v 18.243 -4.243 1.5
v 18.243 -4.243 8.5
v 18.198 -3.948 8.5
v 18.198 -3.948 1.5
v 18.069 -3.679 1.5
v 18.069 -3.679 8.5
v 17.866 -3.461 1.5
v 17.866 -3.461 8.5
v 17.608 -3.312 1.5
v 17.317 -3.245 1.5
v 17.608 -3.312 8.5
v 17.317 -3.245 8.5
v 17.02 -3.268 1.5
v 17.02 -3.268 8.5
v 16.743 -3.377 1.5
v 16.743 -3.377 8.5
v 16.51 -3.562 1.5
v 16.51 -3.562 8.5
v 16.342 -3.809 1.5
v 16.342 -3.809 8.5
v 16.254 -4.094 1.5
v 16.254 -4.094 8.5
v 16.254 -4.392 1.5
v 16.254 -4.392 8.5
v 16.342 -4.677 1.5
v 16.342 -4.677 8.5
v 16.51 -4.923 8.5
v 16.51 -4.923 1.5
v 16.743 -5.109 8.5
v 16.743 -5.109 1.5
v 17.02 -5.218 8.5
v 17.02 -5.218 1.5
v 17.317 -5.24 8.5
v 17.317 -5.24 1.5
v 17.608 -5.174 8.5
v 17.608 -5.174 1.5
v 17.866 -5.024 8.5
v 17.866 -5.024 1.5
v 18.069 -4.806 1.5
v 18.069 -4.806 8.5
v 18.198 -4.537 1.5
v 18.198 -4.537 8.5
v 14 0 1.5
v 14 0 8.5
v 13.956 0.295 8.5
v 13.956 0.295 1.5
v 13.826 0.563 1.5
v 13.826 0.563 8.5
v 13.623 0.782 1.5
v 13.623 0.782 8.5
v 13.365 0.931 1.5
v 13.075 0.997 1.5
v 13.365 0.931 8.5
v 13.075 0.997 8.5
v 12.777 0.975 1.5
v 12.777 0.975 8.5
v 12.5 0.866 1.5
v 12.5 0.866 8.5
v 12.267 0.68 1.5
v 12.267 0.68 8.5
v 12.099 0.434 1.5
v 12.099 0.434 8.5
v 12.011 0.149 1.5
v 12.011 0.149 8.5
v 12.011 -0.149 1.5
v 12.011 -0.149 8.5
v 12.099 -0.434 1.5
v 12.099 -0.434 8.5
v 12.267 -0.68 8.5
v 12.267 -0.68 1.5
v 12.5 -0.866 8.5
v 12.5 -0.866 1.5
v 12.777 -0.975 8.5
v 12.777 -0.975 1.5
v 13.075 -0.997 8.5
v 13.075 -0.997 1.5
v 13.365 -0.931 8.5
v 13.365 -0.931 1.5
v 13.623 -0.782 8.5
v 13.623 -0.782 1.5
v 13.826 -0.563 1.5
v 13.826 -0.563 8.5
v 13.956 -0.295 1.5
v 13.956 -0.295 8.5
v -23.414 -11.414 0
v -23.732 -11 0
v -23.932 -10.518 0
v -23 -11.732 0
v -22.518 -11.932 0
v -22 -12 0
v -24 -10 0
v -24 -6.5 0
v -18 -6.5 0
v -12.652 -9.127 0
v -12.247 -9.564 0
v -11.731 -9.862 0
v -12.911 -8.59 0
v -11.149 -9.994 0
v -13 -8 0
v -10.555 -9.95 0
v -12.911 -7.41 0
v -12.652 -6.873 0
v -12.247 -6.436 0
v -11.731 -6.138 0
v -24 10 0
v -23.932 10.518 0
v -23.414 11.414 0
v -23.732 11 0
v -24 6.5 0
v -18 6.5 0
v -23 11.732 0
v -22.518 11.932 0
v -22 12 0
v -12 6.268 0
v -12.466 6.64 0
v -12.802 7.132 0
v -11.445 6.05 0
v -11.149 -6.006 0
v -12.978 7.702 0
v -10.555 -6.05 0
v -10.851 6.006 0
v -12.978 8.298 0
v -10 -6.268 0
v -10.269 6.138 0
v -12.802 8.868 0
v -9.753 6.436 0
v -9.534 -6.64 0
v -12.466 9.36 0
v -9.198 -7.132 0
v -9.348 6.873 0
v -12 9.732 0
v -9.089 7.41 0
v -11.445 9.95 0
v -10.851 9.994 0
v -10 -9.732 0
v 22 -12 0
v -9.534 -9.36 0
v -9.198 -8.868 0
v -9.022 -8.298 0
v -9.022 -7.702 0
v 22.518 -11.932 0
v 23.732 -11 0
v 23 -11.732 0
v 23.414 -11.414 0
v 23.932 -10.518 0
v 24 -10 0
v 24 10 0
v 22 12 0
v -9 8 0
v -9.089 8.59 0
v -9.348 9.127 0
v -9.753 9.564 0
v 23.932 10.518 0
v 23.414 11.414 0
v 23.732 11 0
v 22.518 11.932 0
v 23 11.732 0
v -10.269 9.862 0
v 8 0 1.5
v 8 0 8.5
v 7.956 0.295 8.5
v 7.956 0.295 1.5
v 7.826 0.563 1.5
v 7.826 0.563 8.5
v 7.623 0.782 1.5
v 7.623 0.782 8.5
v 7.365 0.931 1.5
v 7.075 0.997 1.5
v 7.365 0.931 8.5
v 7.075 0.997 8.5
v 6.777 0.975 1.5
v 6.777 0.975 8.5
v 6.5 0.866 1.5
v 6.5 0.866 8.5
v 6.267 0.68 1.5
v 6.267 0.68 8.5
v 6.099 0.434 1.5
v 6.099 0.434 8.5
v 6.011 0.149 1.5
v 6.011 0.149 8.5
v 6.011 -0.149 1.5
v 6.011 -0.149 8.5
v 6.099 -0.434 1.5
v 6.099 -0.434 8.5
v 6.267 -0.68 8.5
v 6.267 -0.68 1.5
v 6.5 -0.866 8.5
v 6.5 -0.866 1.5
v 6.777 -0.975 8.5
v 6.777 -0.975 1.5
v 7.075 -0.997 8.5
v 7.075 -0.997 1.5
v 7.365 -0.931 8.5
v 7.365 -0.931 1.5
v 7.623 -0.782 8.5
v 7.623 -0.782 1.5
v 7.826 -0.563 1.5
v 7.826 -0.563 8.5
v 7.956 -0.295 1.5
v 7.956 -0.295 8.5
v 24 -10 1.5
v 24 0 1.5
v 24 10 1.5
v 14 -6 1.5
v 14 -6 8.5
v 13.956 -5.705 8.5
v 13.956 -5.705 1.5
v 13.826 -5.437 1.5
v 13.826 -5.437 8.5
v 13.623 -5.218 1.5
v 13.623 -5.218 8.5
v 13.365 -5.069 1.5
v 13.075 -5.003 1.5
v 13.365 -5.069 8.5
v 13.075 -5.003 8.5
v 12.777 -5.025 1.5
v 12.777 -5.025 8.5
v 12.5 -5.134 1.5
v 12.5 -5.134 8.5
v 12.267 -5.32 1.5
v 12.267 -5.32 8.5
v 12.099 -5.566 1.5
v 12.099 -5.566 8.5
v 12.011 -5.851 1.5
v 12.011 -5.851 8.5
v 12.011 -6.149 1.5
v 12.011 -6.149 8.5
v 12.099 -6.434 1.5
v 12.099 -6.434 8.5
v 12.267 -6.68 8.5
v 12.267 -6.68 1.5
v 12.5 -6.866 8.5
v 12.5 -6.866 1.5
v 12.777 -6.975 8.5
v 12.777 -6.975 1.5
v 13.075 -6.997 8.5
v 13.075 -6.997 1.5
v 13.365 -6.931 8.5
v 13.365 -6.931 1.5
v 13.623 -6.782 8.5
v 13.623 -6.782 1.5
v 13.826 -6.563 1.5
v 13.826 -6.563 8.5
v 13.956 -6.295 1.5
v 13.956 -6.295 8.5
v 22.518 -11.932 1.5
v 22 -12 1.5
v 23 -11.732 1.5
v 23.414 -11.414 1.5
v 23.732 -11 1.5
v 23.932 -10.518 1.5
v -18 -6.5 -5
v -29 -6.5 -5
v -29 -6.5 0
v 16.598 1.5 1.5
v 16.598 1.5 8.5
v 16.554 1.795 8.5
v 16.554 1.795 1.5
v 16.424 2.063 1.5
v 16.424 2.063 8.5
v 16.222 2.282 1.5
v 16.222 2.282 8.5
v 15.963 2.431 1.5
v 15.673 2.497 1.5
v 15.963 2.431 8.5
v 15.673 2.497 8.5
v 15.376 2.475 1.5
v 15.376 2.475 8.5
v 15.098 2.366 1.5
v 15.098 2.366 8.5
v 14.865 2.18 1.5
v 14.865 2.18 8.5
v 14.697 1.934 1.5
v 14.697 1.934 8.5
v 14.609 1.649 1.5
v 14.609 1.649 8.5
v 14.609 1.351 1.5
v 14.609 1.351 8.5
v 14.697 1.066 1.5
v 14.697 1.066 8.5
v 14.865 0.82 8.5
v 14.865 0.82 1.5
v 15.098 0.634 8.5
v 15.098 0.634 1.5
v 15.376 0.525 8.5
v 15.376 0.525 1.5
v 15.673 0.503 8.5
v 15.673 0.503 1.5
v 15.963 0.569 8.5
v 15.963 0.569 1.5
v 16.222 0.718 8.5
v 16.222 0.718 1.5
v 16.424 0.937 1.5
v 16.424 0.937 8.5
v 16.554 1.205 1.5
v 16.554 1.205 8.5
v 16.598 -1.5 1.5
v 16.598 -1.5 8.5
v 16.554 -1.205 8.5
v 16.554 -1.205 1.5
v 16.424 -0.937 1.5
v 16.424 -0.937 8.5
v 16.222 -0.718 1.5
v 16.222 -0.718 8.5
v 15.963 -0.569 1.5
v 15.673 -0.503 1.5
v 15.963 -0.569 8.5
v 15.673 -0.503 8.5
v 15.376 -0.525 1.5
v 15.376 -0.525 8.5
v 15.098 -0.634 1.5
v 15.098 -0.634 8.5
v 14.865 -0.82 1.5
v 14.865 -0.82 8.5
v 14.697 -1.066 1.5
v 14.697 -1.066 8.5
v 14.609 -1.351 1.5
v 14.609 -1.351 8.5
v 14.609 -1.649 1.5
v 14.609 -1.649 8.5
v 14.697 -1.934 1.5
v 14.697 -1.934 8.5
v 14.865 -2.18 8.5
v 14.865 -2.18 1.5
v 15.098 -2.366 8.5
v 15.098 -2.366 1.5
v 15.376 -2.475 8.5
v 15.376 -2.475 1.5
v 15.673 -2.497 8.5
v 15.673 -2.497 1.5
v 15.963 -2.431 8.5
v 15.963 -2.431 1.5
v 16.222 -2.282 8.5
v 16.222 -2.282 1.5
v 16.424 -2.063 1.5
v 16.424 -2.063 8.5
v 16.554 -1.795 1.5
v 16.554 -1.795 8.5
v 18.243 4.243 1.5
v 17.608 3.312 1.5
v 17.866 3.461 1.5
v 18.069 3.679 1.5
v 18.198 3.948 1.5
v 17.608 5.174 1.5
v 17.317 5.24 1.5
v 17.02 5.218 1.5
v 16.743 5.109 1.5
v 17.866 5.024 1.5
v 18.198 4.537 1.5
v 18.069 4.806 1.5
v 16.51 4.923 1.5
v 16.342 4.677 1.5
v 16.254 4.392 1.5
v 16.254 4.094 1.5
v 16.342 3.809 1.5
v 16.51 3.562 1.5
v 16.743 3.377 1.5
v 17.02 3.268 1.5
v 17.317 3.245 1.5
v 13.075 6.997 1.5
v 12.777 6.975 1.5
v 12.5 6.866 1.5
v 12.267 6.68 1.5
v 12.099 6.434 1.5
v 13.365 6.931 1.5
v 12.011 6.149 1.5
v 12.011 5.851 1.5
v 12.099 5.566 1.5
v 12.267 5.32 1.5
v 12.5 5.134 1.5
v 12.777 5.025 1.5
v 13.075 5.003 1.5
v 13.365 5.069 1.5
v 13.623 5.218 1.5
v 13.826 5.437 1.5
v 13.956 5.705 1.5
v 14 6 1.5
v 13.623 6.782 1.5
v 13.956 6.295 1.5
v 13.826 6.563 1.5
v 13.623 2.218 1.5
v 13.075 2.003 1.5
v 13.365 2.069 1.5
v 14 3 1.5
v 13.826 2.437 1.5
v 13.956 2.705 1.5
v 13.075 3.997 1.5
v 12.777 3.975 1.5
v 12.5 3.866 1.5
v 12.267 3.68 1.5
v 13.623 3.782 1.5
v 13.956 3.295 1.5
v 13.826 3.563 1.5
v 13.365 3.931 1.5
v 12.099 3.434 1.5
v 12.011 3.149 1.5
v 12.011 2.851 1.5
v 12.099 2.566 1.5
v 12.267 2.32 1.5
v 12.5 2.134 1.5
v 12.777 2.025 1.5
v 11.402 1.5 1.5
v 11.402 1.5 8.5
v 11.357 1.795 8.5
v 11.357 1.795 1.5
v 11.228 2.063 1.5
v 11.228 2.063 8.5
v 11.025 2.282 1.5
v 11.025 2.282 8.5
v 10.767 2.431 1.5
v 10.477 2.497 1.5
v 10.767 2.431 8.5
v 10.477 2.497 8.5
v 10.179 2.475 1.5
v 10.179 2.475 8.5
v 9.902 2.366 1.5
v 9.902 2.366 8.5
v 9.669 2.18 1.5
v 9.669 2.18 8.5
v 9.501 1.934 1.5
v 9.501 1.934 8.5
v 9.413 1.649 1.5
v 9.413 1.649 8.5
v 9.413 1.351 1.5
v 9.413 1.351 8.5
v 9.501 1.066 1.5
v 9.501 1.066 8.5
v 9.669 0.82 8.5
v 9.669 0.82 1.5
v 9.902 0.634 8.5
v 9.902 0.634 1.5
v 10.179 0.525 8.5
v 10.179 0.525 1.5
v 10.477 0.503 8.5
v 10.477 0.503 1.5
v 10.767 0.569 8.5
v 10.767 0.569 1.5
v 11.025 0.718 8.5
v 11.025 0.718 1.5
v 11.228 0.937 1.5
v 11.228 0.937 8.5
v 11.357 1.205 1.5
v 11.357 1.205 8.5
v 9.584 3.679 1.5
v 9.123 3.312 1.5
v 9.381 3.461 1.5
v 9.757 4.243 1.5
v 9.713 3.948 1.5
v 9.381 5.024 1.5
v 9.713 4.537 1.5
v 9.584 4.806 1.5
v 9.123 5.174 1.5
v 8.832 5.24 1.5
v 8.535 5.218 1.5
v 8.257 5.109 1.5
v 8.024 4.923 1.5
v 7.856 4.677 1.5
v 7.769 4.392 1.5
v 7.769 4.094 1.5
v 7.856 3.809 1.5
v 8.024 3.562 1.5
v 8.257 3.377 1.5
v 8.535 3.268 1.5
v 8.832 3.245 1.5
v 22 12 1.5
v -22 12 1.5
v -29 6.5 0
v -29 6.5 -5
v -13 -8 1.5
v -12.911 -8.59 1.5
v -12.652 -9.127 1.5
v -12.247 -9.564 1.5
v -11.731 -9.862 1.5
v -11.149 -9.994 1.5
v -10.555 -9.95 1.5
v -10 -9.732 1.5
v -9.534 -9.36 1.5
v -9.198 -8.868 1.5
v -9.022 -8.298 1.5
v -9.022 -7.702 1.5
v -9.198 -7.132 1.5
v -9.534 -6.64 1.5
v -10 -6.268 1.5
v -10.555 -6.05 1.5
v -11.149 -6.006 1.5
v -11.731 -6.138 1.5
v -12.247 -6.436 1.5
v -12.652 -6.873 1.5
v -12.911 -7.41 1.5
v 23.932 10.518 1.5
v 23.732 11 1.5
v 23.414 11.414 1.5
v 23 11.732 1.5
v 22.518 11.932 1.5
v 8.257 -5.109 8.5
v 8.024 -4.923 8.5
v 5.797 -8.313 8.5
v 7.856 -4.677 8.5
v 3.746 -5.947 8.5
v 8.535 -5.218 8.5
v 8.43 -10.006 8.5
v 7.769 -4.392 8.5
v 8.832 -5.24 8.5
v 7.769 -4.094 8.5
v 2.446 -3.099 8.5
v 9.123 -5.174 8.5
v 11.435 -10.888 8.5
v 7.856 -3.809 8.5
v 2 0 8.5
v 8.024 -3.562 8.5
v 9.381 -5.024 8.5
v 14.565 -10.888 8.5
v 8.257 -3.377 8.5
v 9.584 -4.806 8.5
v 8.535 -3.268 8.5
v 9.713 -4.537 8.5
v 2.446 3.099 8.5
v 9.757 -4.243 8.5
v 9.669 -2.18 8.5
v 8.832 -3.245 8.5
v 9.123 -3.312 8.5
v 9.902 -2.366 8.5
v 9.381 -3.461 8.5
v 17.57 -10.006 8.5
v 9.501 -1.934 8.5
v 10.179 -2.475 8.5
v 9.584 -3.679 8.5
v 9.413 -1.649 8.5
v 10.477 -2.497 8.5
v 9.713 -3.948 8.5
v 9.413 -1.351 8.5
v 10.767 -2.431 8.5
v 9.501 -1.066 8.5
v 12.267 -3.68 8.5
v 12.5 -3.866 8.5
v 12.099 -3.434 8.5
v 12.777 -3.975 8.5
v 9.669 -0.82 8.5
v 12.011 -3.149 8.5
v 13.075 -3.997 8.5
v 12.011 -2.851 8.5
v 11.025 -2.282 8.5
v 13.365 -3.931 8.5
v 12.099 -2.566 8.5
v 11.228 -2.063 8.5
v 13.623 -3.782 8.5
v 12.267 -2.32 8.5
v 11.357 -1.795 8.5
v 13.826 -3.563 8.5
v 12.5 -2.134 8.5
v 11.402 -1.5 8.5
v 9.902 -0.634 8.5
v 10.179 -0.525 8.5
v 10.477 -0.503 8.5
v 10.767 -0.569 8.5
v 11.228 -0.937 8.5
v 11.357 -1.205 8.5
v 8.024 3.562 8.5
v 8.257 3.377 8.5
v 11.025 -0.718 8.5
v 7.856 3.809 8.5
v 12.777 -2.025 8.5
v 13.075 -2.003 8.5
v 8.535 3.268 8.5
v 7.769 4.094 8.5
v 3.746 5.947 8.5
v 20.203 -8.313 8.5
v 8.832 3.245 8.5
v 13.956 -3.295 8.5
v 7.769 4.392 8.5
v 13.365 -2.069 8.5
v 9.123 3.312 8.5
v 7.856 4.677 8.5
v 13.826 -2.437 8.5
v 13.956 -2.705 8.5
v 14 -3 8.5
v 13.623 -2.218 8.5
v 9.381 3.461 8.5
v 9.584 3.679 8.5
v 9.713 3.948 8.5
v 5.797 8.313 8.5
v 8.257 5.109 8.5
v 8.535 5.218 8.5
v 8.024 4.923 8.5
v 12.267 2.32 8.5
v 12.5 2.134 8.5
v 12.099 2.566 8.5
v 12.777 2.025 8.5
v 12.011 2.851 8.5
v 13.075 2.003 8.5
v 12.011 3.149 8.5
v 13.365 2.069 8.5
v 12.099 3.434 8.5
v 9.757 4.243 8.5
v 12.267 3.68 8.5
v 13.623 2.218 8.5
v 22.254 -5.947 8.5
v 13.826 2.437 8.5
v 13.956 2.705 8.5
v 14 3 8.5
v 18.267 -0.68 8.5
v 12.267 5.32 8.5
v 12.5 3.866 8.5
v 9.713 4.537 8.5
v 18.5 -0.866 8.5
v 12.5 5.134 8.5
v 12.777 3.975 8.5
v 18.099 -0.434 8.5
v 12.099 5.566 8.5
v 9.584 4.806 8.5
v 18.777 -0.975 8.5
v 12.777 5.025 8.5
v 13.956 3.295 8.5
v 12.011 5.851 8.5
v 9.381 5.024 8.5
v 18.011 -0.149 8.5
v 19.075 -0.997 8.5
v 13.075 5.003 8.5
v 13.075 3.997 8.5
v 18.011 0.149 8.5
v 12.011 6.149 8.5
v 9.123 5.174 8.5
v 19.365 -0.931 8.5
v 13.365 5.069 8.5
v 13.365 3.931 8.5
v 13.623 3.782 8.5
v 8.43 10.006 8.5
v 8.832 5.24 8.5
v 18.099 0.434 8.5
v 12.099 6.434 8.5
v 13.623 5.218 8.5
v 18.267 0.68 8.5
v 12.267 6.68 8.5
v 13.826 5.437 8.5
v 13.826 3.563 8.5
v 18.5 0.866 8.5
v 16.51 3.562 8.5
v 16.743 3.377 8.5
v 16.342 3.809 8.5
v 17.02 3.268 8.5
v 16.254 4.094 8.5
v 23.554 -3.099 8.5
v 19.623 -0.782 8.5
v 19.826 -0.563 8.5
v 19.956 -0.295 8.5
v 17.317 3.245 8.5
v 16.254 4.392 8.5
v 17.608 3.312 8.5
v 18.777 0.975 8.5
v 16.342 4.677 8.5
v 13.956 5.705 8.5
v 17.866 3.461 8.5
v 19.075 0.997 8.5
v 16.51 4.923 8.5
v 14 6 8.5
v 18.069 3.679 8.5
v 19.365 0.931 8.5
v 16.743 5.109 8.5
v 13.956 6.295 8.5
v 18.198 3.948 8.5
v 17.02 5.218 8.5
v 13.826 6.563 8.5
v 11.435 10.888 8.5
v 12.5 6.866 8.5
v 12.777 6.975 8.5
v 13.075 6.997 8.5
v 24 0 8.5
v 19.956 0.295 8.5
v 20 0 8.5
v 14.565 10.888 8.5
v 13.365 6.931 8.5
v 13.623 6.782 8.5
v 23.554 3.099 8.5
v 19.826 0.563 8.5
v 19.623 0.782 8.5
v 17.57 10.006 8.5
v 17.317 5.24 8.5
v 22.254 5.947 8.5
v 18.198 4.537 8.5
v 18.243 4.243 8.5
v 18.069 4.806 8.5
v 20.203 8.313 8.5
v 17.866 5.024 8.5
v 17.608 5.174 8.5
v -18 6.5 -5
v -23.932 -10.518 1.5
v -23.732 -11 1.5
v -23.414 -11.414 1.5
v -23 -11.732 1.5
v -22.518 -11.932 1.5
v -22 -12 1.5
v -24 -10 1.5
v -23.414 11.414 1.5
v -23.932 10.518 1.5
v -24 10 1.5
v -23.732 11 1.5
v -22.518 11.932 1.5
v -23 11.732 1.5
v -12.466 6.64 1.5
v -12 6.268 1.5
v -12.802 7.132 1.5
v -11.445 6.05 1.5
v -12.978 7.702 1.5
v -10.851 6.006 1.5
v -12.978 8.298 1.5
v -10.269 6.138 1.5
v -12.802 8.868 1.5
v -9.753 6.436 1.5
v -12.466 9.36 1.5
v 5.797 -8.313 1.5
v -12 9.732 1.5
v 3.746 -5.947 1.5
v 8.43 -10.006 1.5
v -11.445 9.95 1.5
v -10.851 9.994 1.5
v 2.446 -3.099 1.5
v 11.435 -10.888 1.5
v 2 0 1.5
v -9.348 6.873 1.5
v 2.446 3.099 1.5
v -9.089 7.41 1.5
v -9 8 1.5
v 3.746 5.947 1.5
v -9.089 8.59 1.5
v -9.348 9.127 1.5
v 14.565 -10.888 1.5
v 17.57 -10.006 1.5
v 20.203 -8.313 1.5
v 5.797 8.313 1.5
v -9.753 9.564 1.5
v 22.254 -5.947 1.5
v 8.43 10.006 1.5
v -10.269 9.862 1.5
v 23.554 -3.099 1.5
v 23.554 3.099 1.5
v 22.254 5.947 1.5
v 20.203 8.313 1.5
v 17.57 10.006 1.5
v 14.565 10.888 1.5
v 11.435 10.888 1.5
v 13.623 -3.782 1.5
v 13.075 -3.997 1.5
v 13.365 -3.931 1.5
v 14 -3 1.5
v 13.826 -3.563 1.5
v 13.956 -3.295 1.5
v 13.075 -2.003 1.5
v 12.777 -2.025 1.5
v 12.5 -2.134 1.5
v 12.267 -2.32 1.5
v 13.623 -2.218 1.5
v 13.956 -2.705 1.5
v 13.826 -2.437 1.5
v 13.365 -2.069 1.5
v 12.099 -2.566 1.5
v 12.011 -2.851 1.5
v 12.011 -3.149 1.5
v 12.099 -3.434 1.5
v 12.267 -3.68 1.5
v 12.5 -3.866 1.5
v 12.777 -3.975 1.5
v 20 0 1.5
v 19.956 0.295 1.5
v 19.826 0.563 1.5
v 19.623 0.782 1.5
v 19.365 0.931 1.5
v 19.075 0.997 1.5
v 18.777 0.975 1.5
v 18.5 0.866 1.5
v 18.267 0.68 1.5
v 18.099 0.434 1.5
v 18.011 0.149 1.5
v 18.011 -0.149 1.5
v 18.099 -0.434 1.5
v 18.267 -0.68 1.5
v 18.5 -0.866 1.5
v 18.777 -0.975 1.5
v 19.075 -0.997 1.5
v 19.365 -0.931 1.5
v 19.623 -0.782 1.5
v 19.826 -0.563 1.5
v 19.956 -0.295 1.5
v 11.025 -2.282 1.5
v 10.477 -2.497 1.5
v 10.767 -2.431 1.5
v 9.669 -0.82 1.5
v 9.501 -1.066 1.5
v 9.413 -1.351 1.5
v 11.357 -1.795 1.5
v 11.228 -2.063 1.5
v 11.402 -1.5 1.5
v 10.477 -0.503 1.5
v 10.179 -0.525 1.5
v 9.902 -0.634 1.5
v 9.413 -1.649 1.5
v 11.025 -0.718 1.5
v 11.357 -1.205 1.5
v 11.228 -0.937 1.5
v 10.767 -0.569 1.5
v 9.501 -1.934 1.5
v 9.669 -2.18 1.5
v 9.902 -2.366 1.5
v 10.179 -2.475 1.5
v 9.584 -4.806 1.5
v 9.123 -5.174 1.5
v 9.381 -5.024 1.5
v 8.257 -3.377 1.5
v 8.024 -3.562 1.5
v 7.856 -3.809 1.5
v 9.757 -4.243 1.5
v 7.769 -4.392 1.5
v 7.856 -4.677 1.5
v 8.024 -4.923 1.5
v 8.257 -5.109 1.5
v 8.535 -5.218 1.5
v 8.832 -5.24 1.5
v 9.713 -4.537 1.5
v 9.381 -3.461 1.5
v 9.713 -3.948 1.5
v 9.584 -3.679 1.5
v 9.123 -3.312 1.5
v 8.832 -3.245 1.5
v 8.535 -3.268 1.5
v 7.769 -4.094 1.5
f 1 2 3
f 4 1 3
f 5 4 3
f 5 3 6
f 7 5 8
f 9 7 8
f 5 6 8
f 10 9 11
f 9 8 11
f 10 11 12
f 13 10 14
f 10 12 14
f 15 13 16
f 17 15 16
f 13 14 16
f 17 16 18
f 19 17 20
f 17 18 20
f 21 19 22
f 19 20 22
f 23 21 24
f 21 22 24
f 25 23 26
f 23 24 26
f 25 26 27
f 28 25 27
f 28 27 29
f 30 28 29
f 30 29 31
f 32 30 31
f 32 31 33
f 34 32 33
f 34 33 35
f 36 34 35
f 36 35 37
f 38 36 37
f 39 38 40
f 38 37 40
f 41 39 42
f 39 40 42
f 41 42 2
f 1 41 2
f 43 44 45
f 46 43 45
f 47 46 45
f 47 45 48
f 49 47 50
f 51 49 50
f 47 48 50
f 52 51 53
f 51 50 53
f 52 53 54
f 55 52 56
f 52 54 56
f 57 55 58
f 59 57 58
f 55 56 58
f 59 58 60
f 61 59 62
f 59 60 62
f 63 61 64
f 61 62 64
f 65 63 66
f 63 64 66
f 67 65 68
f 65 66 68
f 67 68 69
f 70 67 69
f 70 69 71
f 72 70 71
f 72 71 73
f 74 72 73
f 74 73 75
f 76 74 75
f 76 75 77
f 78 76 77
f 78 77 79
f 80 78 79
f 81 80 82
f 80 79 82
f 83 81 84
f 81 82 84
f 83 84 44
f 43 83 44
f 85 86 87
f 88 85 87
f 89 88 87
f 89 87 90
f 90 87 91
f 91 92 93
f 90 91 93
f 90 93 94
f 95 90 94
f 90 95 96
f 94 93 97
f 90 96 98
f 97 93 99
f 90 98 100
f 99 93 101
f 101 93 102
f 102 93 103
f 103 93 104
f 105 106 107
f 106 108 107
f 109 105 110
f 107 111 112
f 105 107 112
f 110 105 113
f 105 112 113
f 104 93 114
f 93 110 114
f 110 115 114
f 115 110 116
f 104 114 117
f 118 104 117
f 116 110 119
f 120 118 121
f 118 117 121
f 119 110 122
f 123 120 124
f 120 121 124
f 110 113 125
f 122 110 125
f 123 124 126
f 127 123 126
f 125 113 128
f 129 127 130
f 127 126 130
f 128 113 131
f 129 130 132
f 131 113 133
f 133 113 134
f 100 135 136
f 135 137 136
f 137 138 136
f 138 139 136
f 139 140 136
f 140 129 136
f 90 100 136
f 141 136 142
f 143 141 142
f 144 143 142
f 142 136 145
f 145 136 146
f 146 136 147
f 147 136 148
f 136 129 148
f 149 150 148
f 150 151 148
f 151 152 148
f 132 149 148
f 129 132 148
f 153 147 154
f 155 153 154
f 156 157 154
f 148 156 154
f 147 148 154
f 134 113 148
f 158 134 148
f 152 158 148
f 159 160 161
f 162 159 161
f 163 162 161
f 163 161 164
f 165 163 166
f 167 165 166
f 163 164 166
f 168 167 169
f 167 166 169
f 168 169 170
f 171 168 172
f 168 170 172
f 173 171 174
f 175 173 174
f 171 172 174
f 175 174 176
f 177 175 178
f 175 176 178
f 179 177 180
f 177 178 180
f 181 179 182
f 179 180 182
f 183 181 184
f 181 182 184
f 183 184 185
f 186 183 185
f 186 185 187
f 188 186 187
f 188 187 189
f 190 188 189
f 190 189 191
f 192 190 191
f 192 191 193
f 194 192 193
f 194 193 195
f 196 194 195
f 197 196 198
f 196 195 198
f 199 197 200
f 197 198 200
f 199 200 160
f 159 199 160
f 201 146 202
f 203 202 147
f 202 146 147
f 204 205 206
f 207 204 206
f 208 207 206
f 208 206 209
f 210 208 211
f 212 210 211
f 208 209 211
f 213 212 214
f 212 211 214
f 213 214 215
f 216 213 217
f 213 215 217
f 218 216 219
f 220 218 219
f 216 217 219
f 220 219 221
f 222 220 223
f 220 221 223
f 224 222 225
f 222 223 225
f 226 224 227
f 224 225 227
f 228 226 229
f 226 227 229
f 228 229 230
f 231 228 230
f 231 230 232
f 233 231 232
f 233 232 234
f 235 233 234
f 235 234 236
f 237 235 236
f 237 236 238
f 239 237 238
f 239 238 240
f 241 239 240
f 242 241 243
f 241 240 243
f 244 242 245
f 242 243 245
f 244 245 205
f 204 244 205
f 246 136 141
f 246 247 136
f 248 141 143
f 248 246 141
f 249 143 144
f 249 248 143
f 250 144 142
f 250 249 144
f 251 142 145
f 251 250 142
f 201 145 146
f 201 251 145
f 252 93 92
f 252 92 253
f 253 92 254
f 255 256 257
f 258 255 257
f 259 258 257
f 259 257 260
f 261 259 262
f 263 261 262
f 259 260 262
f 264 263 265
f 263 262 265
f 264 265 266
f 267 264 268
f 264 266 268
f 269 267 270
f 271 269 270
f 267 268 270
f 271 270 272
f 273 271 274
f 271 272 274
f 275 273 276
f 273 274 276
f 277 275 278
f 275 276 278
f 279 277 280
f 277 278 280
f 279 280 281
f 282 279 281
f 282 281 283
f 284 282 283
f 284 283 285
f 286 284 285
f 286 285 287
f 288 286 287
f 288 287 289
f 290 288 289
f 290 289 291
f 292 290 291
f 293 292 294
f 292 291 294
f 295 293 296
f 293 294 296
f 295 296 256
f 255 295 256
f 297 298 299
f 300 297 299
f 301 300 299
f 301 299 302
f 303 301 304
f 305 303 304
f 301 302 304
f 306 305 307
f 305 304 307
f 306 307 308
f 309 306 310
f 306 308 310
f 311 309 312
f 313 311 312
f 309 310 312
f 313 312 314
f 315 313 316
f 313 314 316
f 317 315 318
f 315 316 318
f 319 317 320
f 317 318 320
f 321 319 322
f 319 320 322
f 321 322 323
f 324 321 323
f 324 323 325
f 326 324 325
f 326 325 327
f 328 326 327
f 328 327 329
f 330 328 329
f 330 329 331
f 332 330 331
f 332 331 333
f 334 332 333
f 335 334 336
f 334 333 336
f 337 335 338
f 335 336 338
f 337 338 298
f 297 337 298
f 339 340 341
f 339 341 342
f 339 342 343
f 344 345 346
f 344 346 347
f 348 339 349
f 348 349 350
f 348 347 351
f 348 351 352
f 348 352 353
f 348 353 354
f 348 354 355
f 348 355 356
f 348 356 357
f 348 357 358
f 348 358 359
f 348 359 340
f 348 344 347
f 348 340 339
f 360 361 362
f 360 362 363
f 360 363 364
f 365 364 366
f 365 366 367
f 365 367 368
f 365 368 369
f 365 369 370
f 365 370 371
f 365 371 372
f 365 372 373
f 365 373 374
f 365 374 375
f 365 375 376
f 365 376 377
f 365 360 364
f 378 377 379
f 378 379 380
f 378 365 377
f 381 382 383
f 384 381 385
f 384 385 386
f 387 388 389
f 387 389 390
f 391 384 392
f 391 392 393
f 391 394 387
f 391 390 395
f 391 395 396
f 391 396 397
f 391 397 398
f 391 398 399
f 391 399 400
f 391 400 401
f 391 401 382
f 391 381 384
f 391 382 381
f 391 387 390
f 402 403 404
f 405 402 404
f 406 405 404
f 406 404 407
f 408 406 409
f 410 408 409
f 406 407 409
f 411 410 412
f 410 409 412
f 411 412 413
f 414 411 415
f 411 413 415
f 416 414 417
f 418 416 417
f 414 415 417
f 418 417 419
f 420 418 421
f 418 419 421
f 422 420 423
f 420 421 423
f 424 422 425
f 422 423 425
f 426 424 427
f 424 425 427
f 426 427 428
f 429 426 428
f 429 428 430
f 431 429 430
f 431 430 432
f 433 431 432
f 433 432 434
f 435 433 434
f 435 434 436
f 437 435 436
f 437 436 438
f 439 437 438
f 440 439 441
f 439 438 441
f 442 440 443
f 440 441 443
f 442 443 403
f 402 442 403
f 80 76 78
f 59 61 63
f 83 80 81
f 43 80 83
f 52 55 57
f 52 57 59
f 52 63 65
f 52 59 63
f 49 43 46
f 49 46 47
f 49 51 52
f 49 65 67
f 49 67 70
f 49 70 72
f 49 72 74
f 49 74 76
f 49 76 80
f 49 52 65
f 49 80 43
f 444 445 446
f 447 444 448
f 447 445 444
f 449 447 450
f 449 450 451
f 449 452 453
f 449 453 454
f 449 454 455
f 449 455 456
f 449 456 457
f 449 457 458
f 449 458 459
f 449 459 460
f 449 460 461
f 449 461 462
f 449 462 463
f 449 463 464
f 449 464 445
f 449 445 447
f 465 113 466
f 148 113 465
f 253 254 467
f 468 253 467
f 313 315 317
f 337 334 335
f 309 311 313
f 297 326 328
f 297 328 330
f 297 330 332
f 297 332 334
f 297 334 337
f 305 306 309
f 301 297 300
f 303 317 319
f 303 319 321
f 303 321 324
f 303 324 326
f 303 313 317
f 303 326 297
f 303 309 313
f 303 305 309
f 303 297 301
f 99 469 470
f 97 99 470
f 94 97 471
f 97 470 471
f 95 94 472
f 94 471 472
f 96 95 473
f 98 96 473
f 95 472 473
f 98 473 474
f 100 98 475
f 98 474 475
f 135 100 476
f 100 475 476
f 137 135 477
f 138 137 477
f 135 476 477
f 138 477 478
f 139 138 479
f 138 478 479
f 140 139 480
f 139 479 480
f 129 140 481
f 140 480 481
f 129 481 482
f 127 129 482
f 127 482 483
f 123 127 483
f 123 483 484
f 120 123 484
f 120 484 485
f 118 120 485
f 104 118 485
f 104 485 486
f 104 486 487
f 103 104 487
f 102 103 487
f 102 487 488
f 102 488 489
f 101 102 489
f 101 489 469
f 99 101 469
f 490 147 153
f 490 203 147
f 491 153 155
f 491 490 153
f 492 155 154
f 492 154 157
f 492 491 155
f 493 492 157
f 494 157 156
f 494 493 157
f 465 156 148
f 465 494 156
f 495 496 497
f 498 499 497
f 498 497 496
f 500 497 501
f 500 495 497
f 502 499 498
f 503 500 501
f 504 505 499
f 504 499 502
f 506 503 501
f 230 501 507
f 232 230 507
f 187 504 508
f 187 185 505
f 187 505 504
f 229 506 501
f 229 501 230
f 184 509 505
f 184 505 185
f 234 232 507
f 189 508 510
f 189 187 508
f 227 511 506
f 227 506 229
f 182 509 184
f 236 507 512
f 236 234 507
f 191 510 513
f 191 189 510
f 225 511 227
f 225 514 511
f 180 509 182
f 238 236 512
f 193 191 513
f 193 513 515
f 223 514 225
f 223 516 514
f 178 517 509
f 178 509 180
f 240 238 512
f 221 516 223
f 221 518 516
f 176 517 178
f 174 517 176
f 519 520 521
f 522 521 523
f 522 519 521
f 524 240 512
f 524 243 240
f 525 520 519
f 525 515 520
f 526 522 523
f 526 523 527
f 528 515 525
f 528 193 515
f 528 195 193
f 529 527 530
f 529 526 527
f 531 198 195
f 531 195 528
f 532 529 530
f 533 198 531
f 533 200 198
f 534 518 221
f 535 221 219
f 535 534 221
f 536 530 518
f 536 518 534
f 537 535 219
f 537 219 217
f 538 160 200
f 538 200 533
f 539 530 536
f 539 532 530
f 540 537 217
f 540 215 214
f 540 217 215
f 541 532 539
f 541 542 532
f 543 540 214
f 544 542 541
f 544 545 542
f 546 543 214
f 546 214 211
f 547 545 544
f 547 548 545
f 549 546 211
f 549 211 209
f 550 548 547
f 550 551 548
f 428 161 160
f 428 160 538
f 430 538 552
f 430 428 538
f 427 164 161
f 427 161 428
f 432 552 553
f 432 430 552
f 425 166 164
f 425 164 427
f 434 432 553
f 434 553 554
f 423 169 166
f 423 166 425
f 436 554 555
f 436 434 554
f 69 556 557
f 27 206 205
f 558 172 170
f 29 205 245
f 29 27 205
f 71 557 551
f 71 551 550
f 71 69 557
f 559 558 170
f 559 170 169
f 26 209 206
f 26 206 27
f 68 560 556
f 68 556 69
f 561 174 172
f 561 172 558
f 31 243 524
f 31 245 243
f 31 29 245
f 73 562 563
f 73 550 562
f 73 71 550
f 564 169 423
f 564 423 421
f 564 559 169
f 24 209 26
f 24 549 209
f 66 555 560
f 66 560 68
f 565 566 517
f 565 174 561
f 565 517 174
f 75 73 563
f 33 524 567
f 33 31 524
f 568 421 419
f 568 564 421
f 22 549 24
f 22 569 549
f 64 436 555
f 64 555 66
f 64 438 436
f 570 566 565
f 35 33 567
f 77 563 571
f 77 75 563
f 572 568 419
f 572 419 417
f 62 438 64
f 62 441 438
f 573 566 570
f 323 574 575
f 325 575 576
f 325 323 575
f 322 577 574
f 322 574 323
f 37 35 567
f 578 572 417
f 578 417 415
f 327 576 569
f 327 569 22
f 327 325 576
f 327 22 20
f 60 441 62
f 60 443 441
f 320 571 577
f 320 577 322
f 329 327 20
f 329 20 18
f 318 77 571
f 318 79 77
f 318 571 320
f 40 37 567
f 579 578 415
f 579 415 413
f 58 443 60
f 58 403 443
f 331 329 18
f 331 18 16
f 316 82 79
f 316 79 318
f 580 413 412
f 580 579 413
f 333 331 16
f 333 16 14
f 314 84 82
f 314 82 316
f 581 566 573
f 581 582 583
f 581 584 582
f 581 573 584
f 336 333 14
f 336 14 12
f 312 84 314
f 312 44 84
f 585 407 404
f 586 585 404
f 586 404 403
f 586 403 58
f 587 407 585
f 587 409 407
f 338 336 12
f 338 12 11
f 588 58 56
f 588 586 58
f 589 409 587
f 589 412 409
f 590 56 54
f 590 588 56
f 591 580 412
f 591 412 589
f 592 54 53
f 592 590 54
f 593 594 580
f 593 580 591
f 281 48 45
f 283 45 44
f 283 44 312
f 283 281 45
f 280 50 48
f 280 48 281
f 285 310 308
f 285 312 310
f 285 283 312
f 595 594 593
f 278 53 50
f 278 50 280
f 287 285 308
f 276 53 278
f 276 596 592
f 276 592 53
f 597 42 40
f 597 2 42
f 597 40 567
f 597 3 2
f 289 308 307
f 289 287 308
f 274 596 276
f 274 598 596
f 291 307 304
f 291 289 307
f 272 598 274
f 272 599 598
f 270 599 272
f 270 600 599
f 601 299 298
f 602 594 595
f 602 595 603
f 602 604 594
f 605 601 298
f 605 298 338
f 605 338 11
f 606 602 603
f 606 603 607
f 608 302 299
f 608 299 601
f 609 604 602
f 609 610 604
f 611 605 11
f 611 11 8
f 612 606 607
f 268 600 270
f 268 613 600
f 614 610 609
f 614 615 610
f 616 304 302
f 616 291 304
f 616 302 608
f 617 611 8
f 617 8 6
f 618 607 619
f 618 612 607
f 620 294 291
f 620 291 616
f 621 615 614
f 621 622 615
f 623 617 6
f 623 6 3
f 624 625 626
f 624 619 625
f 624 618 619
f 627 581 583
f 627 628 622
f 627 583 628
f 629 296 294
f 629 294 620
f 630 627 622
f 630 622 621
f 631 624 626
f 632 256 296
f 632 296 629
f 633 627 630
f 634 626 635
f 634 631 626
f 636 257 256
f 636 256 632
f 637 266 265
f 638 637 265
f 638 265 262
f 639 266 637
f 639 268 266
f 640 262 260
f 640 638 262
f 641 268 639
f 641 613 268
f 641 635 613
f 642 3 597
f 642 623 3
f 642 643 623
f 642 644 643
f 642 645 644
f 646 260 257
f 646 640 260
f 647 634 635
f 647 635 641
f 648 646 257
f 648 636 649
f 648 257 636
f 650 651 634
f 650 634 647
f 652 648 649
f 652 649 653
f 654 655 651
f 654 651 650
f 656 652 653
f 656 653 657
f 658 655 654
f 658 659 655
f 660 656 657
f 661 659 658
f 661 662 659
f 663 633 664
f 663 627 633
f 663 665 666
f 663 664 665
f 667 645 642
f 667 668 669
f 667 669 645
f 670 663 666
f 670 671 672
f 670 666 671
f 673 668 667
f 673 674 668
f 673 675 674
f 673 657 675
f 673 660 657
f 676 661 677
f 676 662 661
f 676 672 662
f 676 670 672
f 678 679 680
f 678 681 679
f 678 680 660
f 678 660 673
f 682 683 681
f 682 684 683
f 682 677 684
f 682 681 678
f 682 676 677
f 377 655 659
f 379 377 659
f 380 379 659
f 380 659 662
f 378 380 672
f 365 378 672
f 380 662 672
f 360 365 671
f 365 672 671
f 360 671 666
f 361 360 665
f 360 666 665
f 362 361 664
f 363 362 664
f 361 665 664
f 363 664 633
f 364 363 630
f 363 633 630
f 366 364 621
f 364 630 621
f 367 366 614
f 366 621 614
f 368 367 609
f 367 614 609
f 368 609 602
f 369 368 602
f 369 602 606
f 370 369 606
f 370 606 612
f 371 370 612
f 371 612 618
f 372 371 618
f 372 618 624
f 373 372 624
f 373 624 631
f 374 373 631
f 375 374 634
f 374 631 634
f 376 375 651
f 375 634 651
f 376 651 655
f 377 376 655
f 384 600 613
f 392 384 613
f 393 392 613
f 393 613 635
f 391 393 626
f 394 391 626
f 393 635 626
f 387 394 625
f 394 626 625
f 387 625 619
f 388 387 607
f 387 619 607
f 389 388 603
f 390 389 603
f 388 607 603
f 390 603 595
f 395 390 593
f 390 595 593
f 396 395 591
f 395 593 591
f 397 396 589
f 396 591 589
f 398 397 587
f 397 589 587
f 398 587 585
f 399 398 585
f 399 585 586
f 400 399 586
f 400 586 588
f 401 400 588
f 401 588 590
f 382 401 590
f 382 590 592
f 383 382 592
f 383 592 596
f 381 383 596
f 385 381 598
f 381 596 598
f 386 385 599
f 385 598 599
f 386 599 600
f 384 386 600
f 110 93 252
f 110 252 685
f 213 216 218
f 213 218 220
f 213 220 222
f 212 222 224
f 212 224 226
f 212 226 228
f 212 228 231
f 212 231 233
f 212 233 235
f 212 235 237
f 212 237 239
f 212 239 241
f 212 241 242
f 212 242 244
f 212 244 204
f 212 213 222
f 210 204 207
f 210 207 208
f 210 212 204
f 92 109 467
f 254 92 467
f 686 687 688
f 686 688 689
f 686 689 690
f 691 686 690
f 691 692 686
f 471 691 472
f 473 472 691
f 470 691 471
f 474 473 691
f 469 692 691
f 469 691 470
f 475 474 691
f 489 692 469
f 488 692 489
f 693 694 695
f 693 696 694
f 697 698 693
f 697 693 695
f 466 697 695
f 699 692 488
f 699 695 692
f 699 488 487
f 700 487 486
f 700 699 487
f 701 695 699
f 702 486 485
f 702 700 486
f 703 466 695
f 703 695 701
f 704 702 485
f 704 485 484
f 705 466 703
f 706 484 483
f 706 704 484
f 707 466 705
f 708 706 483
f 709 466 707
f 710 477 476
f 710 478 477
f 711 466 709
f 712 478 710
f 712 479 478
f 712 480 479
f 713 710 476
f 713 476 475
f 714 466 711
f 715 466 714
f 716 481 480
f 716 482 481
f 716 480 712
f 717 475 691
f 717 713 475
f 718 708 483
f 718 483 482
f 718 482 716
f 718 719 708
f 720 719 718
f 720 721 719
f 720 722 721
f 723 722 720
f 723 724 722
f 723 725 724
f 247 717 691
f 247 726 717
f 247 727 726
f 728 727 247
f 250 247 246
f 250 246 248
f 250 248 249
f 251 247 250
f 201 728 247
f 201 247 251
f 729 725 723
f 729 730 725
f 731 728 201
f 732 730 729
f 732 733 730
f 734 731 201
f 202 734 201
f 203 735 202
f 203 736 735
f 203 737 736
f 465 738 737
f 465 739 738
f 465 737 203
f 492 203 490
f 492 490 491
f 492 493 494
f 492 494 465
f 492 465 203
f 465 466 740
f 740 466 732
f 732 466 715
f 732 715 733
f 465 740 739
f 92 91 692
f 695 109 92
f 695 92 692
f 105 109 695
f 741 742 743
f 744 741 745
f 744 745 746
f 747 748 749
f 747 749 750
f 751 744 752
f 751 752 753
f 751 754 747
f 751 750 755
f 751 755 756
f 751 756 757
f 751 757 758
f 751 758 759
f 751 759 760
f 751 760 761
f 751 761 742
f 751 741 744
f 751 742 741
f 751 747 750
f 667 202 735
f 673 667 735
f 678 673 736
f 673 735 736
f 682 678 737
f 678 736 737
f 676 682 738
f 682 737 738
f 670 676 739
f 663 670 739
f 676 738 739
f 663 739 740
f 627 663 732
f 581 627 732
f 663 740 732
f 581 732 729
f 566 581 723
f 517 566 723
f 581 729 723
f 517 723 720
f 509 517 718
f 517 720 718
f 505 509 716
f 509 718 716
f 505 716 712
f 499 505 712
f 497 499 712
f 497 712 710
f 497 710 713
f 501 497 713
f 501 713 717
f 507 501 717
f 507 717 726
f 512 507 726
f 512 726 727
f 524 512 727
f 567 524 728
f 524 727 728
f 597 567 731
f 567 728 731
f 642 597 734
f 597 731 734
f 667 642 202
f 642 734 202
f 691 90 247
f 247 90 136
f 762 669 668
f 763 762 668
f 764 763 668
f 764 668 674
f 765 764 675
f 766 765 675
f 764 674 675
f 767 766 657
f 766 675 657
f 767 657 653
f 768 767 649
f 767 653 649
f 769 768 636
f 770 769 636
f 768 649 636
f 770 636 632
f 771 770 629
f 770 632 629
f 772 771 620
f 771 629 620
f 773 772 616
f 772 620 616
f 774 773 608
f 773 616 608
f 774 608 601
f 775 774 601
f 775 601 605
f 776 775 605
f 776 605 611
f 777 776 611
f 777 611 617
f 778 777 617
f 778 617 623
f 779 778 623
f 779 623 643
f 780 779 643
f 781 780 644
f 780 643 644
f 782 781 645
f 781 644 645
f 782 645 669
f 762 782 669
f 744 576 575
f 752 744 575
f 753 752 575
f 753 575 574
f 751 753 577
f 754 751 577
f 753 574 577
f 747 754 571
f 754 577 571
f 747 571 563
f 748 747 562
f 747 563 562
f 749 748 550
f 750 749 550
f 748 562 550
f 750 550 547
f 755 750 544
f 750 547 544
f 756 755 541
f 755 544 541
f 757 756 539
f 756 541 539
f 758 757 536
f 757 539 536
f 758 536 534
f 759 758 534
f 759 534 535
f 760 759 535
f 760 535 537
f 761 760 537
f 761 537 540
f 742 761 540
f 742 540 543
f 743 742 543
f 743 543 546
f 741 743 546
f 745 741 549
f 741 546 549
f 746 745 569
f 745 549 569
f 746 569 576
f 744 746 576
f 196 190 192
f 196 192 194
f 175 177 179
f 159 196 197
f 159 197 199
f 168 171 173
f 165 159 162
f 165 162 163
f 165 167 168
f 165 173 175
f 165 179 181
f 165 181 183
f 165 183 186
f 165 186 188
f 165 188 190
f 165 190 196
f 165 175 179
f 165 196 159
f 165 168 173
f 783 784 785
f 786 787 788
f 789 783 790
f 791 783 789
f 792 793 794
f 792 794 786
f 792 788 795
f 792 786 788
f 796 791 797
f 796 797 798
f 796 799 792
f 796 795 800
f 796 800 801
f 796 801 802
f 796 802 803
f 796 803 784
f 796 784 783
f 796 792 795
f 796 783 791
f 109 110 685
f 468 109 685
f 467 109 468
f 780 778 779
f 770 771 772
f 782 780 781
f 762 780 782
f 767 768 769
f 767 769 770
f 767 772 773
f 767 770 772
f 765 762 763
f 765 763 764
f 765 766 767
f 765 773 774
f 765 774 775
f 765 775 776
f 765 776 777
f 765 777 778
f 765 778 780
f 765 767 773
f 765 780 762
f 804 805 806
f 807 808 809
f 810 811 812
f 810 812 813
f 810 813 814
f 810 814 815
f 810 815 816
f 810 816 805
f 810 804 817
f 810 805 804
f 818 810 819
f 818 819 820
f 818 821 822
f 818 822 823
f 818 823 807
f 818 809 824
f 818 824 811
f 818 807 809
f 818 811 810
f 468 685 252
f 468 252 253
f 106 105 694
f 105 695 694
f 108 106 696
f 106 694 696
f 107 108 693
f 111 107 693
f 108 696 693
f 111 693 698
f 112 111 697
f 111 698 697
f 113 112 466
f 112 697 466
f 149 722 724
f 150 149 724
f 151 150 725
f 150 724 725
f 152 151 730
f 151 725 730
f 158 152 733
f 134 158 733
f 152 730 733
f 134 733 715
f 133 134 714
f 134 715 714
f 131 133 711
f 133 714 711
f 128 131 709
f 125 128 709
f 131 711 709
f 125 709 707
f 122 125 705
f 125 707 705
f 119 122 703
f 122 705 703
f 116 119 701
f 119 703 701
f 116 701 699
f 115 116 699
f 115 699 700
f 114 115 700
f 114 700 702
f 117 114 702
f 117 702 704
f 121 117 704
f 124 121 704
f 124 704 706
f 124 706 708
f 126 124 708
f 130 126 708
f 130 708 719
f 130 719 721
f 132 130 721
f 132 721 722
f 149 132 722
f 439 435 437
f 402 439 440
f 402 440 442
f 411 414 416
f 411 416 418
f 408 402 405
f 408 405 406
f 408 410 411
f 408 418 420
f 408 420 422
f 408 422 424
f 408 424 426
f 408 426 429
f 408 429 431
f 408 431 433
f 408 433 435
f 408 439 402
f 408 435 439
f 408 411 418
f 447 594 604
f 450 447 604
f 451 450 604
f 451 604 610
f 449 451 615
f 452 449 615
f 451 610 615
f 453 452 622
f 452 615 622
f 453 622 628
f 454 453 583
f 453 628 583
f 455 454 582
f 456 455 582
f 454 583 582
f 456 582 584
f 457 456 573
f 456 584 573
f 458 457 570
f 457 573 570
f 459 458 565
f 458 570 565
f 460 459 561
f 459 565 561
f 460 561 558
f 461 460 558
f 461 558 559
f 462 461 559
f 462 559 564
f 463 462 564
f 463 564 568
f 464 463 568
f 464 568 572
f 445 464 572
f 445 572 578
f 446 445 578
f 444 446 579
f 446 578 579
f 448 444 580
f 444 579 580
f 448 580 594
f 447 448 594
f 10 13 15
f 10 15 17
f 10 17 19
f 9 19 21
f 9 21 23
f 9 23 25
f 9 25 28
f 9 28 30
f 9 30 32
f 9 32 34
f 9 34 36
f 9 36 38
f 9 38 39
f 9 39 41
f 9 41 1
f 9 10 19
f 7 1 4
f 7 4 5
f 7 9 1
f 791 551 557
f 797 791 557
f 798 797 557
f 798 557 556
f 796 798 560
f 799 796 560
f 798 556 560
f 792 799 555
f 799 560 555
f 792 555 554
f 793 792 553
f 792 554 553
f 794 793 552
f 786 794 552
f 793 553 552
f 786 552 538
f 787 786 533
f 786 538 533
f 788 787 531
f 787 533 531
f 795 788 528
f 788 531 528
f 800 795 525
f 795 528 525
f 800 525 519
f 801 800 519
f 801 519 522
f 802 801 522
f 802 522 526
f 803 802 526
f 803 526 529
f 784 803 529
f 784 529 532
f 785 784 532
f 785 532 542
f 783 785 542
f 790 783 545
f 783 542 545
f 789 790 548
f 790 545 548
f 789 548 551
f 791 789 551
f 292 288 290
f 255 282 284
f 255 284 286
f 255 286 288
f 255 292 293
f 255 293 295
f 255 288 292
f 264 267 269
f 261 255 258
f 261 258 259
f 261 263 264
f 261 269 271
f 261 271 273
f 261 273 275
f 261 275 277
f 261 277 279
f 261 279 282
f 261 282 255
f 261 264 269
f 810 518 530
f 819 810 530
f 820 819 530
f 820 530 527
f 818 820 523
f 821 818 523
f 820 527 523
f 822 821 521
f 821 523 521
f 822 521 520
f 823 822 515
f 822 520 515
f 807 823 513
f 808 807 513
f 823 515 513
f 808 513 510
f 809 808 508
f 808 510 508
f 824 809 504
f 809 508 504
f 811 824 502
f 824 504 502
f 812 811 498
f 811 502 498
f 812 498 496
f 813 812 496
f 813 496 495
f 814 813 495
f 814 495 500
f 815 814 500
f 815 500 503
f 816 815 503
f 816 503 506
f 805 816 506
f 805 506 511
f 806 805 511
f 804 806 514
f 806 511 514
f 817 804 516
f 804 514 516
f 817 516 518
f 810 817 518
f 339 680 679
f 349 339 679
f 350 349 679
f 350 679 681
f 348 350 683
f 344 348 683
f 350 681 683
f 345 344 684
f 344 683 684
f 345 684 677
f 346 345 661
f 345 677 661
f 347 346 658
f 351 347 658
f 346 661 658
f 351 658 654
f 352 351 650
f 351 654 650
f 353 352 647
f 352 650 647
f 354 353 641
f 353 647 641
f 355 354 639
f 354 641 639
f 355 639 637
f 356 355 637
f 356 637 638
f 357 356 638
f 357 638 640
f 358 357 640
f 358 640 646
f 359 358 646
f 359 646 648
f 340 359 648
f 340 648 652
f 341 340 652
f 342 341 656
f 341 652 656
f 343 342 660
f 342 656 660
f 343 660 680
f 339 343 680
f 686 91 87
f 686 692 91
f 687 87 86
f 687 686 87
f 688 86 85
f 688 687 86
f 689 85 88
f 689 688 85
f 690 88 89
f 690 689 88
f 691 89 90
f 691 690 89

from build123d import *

# Parameters (mm, degrees)
SKETCH_1_W          = 48
SKETCH_1_H          = 24
EXTRUDE_1_DEPTH     = 1.5
FILLET_1_R          = 2
SKETCH_2_R          = 11
EXTRUDE_2_DEPTH     = 7
SKETCH_3_W          = 11
SKETCH_3_H          = 13
EXTRUDE_3_DEPTH     = 5
SKETCH_4_R          = 2
CUT_EXTRUDE_1_DEPTH = 5
SKETCH_5_R          = 1
CUT_EXTRUDE_2_DEPTH = 7


with BuildPart() as part:
    # 草图1 → 凸台-拉伸1 (new body)
    with BuildSketch(Plane.XY):
        Rectangle(SKETCH_1_W, SKETCH_1_H)
    extrude(amount=EXTRUDE_1_DEPTH)

    # 圆角1
    fillet_1_edges = [part.edges().sort_by_distance(p)[0] for p in [
        (24, -12, 0.75),
        (-24, -12, 0.75),
        (-24, 12, 0.75),
        (24, 12, 0.75),
    ]]
    fillet(fillet_1_edges, radius=FILLET_1_R)

    # 草图2 → 凸台-拉伸2 (add)
    with BuildSketch(Plane.XY.offset(1.5)):
        with Locations((13, 0)):
            Circle(SKETCH_2_R)
    extrude(amount=EXTRUDE_2_DEPTH)

    # 草图3 → 凸台-拉伸3 (add)
    with BuildSketch(Plane(origin=(0, 0, 0), x_dir=(-1, 0, 0), z_dir=(0, 0, -1))):
        with Locations((23.5, 0)):
            Rectangle(SKETCH_3_W, SKETCH_3_H)
    extrude(amount=EXTRUDE_3_DEPTH)

    # 草图4 → 切除-拉伸1 (cut)
    with BuildSketch(Plane.XY.offset(1.5)):
        with Locations((-11, 8)):
            Circle(SKETCH_4_R)
        with Locations(Location((-11, -8, 0), (0, 0, 180))):
            Circle(SKETCH_4_R)
    extrude(amount=-CUT_EXTRUDE_1_DEPTH, mode=Mode.SUBTRACT)

    # 草图5 → 切除-拉伸2 (cut)
    with BuildSketch(Plane.XY.offset(8.5)):
        with Locations((13, 0)):
            Circle(SKETCH_5_R)
        with Locations((13, 3)):
            Circle(SKETCH_5_R)
        with Locations((7, 0)):
            Circle(SKETCH_5_R)
        with Locations((15.598076211, 1.5)):
            Circle(SKETCH_5_R)
        with Locations((15.598076211, -1.5)):
            Circle(SKETCH_5_R)
        with Locations((13, -3)):
            Circle(SKETCH_5_R)
        with Locations((10.401923789, -1.5)):
            Circle(SKETCH_5_R)
        with Locations((10.401923789, 1.5)):
            Circle(SKETCH_5_R)
        with Locations((8.757359313, 4.242640687)):
            Circle(SKETCH_5_R)
        with Locations((13, 6)):
            Circle(SKETCH_5_R)
        with Locations((17.242640687, 4.242640687)):
            Circle(SKETCH_5_R)
        with Locations((19, 0)):
            Circle(SKETCH_5_R)
        with Locations((17.242640687, -4.242640687)):
            Circle(SKETCH_5_R)
        with Locations((13, -6)):
            Circle(SKETCH_5_R)
        with Locations((8.757359313, -4.242640687)):
            Circle(SKETCH_5_R)
    extrude(amount=-CUT_EXTRUDE_2_DEPTH, mode=Mode.SUBTRACT)


solid = part.part
